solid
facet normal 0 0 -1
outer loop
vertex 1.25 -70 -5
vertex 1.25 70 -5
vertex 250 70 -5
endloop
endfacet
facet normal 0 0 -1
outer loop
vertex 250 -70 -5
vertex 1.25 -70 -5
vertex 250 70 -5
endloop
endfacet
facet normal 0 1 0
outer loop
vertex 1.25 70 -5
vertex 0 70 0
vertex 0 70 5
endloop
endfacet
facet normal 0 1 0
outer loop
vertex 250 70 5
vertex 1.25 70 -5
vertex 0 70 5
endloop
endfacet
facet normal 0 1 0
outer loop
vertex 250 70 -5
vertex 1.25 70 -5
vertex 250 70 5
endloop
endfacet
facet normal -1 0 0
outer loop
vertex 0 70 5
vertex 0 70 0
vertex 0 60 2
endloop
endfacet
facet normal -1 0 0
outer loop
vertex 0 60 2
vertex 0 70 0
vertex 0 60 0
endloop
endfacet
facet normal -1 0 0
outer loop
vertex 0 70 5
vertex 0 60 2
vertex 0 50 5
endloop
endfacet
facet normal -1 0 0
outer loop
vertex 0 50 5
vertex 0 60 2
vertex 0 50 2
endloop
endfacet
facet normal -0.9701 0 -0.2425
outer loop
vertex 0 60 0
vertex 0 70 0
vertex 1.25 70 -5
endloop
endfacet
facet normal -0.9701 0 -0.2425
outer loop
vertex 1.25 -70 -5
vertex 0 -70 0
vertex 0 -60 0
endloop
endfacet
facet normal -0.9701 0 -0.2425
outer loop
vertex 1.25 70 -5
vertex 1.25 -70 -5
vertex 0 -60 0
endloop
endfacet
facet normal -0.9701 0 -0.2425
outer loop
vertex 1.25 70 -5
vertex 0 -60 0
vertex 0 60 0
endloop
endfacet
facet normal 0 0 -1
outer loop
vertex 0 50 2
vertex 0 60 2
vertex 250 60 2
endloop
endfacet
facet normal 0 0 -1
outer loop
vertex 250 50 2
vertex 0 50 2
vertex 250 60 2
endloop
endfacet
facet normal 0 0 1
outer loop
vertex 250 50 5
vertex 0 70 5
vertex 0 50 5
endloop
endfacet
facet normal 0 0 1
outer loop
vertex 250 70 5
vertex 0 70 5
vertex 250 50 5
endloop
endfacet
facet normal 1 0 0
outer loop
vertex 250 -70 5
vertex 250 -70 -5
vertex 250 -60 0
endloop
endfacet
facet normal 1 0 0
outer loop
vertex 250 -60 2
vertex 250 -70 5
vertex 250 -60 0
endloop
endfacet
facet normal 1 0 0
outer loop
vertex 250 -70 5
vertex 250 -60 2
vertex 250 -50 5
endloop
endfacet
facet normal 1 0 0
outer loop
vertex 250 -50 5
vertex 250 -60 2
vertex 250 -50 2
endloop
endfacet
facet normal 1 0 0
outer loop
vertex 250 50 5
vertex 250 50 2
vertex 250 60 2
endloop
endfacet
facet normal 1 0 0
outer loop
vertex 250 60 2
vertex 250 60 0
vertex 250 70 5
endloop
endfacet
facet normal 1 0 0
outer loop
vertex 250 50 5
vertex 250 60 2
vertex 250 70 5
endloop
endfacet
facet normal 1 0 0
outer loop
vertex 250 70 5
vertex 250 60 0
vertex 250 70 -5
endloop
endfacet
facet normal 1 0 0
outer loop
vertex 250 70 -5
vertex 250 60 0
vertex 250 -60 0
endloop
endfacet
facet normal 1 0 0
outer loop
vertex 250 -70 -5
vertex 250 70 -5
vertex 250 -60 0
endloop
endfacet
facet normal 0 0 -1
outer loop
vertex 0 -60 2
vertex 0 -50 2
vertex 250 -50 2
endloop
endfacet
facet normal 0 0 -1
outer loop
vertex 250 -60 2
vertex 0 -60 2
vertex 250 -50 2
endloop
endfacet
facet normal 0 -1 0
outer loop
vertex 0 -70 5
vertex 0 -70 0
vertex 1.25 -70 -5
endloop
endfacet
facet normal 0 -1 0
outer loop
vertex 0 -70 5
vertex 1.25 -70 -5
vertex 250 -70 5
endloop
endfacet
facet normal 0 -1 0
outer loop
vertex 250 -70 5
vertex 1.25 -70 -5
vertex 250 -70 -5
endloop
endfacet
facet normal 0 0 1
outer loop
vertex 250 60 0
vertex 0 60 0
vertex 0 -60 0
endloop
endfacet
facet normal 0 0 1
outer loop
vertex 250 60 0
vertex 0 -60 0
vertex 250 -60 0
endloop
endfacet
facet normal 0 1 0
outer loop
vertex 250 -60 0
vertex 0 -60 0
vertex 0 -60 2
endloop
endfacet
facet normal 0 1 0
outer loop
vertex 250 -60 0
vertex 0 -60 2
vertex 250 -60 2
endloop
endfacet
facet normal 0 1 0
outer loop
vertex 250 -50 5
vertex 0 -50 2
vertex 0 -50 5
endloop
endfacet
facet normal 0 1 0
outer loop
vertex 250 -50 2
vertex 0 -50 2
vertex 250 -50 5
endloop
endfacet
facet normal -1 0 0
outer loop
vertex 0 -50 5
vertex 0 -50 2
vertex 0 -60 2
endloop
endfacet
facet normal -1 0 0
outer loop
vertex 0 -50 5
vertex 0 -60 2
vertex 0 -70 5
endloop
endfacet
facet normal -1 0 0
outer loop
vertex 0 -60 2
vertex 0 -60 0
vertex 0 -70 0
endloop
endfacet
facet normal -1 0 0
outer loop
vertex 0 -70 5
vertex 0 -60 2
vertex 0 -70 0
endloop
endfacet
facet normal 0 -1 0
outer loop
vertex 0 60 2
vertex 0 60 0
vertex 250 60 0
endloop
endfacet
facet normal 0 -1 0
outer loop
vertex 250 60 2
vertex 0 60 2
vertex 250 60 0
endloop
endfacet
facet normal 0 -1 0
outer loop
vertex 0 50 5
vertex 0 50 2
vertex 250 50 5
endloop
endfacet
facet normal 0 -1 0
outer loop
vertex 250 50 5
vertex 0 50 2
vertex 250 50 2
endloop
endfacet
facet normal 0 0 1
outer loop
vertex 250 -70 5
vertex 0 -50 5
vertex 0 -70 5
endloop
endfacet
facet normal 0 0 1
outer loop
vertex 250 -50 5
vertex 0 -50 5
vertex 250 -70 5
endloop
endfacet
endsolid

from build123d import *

# Parameters (mm, degrees)
BOSS_EXTRUDE1_DEPTH      = 5
BOSS_EXTRUDE1_DEPTH_BACK = 5
SKETCH1_W                = 250
SKETCH1_H                = 140
SKETCH1_3_W              = 250
SKETCH1_3_H              = 100
CUT_EXTRUDE1_DEPTH       = 260.663243452
SKETCH1_4_W              = 250
SKETCH1_4_H              = 10
CUT_EXTRUDE2_DEPTH       = 2
CUT_EXTRUDE3_DEPTH       = 260.663243452
CUT_EXTRUDE3_DEPTH_BACK  = 260.663243452


with BuildPart() as part:
    # Sketch1 → Boss-Extrude1 (new, two sides: drawn at the far end of the back side and taken through both)
    with BuildSketch(Plane.XY.offset(-BOSS_EXTRUDE1_DEPTH_BACK)):
        with Locations((125, 0)):
            Rectangle(SKETCH1_W, SKETCH1_H)
    extrude(amount=BOSS_EXTRUDE1_DEPTH + BOSS_EXTRUDE1_DEPTH_BACK)

    # Sketch1<3> → Cut-Extrude1 (cut, through all)
    with BuildSketch(Plane.XY):
        with Locations((125, 0)):
            Rectangle(SKETCH1_3_W, SKETCH1_3_H)
    extrude(amount=CUT_EXTRUDE1_DEPTH, mode=Mode.SUBTRACT)

    # Sketch1<4> → Cut-Extrude2 (cut)
    with BuildSketch(Plane.XY):
        with Locations((125, 55)):
            Rectangle(SKETCH1_4_W, SKETCH1_4_H)
        with Locations((125, -55)):
            Rectangle(SKETCH1_4_W, SKETCH1_4_H)
    extrude(amount=CUT_EXTRUDE2_DEPTH, mode=Mode.SUBTRACT)

    # Sketch2 → Cut-Extrude3 (cut, two sides: drawn at the far end of the back side and taken through both)
    with BuildSketch(Plane(origin=(0, 0, 0), x_dir=(1, 0, 0), z_dir=(0, 1, 0)).offset(-CUT_EXTRUDE3_DEPTH_BACK)):
        Polygon((0, 0), (7.5, 30), (0, 30), align=None)
    extrude(amount=CUT_EXTRUDE3_DEPTH + CUT_EXTRUDE3_DEPTH_BACK, mode=Mode.SUBTRACT)


solid = part.part
